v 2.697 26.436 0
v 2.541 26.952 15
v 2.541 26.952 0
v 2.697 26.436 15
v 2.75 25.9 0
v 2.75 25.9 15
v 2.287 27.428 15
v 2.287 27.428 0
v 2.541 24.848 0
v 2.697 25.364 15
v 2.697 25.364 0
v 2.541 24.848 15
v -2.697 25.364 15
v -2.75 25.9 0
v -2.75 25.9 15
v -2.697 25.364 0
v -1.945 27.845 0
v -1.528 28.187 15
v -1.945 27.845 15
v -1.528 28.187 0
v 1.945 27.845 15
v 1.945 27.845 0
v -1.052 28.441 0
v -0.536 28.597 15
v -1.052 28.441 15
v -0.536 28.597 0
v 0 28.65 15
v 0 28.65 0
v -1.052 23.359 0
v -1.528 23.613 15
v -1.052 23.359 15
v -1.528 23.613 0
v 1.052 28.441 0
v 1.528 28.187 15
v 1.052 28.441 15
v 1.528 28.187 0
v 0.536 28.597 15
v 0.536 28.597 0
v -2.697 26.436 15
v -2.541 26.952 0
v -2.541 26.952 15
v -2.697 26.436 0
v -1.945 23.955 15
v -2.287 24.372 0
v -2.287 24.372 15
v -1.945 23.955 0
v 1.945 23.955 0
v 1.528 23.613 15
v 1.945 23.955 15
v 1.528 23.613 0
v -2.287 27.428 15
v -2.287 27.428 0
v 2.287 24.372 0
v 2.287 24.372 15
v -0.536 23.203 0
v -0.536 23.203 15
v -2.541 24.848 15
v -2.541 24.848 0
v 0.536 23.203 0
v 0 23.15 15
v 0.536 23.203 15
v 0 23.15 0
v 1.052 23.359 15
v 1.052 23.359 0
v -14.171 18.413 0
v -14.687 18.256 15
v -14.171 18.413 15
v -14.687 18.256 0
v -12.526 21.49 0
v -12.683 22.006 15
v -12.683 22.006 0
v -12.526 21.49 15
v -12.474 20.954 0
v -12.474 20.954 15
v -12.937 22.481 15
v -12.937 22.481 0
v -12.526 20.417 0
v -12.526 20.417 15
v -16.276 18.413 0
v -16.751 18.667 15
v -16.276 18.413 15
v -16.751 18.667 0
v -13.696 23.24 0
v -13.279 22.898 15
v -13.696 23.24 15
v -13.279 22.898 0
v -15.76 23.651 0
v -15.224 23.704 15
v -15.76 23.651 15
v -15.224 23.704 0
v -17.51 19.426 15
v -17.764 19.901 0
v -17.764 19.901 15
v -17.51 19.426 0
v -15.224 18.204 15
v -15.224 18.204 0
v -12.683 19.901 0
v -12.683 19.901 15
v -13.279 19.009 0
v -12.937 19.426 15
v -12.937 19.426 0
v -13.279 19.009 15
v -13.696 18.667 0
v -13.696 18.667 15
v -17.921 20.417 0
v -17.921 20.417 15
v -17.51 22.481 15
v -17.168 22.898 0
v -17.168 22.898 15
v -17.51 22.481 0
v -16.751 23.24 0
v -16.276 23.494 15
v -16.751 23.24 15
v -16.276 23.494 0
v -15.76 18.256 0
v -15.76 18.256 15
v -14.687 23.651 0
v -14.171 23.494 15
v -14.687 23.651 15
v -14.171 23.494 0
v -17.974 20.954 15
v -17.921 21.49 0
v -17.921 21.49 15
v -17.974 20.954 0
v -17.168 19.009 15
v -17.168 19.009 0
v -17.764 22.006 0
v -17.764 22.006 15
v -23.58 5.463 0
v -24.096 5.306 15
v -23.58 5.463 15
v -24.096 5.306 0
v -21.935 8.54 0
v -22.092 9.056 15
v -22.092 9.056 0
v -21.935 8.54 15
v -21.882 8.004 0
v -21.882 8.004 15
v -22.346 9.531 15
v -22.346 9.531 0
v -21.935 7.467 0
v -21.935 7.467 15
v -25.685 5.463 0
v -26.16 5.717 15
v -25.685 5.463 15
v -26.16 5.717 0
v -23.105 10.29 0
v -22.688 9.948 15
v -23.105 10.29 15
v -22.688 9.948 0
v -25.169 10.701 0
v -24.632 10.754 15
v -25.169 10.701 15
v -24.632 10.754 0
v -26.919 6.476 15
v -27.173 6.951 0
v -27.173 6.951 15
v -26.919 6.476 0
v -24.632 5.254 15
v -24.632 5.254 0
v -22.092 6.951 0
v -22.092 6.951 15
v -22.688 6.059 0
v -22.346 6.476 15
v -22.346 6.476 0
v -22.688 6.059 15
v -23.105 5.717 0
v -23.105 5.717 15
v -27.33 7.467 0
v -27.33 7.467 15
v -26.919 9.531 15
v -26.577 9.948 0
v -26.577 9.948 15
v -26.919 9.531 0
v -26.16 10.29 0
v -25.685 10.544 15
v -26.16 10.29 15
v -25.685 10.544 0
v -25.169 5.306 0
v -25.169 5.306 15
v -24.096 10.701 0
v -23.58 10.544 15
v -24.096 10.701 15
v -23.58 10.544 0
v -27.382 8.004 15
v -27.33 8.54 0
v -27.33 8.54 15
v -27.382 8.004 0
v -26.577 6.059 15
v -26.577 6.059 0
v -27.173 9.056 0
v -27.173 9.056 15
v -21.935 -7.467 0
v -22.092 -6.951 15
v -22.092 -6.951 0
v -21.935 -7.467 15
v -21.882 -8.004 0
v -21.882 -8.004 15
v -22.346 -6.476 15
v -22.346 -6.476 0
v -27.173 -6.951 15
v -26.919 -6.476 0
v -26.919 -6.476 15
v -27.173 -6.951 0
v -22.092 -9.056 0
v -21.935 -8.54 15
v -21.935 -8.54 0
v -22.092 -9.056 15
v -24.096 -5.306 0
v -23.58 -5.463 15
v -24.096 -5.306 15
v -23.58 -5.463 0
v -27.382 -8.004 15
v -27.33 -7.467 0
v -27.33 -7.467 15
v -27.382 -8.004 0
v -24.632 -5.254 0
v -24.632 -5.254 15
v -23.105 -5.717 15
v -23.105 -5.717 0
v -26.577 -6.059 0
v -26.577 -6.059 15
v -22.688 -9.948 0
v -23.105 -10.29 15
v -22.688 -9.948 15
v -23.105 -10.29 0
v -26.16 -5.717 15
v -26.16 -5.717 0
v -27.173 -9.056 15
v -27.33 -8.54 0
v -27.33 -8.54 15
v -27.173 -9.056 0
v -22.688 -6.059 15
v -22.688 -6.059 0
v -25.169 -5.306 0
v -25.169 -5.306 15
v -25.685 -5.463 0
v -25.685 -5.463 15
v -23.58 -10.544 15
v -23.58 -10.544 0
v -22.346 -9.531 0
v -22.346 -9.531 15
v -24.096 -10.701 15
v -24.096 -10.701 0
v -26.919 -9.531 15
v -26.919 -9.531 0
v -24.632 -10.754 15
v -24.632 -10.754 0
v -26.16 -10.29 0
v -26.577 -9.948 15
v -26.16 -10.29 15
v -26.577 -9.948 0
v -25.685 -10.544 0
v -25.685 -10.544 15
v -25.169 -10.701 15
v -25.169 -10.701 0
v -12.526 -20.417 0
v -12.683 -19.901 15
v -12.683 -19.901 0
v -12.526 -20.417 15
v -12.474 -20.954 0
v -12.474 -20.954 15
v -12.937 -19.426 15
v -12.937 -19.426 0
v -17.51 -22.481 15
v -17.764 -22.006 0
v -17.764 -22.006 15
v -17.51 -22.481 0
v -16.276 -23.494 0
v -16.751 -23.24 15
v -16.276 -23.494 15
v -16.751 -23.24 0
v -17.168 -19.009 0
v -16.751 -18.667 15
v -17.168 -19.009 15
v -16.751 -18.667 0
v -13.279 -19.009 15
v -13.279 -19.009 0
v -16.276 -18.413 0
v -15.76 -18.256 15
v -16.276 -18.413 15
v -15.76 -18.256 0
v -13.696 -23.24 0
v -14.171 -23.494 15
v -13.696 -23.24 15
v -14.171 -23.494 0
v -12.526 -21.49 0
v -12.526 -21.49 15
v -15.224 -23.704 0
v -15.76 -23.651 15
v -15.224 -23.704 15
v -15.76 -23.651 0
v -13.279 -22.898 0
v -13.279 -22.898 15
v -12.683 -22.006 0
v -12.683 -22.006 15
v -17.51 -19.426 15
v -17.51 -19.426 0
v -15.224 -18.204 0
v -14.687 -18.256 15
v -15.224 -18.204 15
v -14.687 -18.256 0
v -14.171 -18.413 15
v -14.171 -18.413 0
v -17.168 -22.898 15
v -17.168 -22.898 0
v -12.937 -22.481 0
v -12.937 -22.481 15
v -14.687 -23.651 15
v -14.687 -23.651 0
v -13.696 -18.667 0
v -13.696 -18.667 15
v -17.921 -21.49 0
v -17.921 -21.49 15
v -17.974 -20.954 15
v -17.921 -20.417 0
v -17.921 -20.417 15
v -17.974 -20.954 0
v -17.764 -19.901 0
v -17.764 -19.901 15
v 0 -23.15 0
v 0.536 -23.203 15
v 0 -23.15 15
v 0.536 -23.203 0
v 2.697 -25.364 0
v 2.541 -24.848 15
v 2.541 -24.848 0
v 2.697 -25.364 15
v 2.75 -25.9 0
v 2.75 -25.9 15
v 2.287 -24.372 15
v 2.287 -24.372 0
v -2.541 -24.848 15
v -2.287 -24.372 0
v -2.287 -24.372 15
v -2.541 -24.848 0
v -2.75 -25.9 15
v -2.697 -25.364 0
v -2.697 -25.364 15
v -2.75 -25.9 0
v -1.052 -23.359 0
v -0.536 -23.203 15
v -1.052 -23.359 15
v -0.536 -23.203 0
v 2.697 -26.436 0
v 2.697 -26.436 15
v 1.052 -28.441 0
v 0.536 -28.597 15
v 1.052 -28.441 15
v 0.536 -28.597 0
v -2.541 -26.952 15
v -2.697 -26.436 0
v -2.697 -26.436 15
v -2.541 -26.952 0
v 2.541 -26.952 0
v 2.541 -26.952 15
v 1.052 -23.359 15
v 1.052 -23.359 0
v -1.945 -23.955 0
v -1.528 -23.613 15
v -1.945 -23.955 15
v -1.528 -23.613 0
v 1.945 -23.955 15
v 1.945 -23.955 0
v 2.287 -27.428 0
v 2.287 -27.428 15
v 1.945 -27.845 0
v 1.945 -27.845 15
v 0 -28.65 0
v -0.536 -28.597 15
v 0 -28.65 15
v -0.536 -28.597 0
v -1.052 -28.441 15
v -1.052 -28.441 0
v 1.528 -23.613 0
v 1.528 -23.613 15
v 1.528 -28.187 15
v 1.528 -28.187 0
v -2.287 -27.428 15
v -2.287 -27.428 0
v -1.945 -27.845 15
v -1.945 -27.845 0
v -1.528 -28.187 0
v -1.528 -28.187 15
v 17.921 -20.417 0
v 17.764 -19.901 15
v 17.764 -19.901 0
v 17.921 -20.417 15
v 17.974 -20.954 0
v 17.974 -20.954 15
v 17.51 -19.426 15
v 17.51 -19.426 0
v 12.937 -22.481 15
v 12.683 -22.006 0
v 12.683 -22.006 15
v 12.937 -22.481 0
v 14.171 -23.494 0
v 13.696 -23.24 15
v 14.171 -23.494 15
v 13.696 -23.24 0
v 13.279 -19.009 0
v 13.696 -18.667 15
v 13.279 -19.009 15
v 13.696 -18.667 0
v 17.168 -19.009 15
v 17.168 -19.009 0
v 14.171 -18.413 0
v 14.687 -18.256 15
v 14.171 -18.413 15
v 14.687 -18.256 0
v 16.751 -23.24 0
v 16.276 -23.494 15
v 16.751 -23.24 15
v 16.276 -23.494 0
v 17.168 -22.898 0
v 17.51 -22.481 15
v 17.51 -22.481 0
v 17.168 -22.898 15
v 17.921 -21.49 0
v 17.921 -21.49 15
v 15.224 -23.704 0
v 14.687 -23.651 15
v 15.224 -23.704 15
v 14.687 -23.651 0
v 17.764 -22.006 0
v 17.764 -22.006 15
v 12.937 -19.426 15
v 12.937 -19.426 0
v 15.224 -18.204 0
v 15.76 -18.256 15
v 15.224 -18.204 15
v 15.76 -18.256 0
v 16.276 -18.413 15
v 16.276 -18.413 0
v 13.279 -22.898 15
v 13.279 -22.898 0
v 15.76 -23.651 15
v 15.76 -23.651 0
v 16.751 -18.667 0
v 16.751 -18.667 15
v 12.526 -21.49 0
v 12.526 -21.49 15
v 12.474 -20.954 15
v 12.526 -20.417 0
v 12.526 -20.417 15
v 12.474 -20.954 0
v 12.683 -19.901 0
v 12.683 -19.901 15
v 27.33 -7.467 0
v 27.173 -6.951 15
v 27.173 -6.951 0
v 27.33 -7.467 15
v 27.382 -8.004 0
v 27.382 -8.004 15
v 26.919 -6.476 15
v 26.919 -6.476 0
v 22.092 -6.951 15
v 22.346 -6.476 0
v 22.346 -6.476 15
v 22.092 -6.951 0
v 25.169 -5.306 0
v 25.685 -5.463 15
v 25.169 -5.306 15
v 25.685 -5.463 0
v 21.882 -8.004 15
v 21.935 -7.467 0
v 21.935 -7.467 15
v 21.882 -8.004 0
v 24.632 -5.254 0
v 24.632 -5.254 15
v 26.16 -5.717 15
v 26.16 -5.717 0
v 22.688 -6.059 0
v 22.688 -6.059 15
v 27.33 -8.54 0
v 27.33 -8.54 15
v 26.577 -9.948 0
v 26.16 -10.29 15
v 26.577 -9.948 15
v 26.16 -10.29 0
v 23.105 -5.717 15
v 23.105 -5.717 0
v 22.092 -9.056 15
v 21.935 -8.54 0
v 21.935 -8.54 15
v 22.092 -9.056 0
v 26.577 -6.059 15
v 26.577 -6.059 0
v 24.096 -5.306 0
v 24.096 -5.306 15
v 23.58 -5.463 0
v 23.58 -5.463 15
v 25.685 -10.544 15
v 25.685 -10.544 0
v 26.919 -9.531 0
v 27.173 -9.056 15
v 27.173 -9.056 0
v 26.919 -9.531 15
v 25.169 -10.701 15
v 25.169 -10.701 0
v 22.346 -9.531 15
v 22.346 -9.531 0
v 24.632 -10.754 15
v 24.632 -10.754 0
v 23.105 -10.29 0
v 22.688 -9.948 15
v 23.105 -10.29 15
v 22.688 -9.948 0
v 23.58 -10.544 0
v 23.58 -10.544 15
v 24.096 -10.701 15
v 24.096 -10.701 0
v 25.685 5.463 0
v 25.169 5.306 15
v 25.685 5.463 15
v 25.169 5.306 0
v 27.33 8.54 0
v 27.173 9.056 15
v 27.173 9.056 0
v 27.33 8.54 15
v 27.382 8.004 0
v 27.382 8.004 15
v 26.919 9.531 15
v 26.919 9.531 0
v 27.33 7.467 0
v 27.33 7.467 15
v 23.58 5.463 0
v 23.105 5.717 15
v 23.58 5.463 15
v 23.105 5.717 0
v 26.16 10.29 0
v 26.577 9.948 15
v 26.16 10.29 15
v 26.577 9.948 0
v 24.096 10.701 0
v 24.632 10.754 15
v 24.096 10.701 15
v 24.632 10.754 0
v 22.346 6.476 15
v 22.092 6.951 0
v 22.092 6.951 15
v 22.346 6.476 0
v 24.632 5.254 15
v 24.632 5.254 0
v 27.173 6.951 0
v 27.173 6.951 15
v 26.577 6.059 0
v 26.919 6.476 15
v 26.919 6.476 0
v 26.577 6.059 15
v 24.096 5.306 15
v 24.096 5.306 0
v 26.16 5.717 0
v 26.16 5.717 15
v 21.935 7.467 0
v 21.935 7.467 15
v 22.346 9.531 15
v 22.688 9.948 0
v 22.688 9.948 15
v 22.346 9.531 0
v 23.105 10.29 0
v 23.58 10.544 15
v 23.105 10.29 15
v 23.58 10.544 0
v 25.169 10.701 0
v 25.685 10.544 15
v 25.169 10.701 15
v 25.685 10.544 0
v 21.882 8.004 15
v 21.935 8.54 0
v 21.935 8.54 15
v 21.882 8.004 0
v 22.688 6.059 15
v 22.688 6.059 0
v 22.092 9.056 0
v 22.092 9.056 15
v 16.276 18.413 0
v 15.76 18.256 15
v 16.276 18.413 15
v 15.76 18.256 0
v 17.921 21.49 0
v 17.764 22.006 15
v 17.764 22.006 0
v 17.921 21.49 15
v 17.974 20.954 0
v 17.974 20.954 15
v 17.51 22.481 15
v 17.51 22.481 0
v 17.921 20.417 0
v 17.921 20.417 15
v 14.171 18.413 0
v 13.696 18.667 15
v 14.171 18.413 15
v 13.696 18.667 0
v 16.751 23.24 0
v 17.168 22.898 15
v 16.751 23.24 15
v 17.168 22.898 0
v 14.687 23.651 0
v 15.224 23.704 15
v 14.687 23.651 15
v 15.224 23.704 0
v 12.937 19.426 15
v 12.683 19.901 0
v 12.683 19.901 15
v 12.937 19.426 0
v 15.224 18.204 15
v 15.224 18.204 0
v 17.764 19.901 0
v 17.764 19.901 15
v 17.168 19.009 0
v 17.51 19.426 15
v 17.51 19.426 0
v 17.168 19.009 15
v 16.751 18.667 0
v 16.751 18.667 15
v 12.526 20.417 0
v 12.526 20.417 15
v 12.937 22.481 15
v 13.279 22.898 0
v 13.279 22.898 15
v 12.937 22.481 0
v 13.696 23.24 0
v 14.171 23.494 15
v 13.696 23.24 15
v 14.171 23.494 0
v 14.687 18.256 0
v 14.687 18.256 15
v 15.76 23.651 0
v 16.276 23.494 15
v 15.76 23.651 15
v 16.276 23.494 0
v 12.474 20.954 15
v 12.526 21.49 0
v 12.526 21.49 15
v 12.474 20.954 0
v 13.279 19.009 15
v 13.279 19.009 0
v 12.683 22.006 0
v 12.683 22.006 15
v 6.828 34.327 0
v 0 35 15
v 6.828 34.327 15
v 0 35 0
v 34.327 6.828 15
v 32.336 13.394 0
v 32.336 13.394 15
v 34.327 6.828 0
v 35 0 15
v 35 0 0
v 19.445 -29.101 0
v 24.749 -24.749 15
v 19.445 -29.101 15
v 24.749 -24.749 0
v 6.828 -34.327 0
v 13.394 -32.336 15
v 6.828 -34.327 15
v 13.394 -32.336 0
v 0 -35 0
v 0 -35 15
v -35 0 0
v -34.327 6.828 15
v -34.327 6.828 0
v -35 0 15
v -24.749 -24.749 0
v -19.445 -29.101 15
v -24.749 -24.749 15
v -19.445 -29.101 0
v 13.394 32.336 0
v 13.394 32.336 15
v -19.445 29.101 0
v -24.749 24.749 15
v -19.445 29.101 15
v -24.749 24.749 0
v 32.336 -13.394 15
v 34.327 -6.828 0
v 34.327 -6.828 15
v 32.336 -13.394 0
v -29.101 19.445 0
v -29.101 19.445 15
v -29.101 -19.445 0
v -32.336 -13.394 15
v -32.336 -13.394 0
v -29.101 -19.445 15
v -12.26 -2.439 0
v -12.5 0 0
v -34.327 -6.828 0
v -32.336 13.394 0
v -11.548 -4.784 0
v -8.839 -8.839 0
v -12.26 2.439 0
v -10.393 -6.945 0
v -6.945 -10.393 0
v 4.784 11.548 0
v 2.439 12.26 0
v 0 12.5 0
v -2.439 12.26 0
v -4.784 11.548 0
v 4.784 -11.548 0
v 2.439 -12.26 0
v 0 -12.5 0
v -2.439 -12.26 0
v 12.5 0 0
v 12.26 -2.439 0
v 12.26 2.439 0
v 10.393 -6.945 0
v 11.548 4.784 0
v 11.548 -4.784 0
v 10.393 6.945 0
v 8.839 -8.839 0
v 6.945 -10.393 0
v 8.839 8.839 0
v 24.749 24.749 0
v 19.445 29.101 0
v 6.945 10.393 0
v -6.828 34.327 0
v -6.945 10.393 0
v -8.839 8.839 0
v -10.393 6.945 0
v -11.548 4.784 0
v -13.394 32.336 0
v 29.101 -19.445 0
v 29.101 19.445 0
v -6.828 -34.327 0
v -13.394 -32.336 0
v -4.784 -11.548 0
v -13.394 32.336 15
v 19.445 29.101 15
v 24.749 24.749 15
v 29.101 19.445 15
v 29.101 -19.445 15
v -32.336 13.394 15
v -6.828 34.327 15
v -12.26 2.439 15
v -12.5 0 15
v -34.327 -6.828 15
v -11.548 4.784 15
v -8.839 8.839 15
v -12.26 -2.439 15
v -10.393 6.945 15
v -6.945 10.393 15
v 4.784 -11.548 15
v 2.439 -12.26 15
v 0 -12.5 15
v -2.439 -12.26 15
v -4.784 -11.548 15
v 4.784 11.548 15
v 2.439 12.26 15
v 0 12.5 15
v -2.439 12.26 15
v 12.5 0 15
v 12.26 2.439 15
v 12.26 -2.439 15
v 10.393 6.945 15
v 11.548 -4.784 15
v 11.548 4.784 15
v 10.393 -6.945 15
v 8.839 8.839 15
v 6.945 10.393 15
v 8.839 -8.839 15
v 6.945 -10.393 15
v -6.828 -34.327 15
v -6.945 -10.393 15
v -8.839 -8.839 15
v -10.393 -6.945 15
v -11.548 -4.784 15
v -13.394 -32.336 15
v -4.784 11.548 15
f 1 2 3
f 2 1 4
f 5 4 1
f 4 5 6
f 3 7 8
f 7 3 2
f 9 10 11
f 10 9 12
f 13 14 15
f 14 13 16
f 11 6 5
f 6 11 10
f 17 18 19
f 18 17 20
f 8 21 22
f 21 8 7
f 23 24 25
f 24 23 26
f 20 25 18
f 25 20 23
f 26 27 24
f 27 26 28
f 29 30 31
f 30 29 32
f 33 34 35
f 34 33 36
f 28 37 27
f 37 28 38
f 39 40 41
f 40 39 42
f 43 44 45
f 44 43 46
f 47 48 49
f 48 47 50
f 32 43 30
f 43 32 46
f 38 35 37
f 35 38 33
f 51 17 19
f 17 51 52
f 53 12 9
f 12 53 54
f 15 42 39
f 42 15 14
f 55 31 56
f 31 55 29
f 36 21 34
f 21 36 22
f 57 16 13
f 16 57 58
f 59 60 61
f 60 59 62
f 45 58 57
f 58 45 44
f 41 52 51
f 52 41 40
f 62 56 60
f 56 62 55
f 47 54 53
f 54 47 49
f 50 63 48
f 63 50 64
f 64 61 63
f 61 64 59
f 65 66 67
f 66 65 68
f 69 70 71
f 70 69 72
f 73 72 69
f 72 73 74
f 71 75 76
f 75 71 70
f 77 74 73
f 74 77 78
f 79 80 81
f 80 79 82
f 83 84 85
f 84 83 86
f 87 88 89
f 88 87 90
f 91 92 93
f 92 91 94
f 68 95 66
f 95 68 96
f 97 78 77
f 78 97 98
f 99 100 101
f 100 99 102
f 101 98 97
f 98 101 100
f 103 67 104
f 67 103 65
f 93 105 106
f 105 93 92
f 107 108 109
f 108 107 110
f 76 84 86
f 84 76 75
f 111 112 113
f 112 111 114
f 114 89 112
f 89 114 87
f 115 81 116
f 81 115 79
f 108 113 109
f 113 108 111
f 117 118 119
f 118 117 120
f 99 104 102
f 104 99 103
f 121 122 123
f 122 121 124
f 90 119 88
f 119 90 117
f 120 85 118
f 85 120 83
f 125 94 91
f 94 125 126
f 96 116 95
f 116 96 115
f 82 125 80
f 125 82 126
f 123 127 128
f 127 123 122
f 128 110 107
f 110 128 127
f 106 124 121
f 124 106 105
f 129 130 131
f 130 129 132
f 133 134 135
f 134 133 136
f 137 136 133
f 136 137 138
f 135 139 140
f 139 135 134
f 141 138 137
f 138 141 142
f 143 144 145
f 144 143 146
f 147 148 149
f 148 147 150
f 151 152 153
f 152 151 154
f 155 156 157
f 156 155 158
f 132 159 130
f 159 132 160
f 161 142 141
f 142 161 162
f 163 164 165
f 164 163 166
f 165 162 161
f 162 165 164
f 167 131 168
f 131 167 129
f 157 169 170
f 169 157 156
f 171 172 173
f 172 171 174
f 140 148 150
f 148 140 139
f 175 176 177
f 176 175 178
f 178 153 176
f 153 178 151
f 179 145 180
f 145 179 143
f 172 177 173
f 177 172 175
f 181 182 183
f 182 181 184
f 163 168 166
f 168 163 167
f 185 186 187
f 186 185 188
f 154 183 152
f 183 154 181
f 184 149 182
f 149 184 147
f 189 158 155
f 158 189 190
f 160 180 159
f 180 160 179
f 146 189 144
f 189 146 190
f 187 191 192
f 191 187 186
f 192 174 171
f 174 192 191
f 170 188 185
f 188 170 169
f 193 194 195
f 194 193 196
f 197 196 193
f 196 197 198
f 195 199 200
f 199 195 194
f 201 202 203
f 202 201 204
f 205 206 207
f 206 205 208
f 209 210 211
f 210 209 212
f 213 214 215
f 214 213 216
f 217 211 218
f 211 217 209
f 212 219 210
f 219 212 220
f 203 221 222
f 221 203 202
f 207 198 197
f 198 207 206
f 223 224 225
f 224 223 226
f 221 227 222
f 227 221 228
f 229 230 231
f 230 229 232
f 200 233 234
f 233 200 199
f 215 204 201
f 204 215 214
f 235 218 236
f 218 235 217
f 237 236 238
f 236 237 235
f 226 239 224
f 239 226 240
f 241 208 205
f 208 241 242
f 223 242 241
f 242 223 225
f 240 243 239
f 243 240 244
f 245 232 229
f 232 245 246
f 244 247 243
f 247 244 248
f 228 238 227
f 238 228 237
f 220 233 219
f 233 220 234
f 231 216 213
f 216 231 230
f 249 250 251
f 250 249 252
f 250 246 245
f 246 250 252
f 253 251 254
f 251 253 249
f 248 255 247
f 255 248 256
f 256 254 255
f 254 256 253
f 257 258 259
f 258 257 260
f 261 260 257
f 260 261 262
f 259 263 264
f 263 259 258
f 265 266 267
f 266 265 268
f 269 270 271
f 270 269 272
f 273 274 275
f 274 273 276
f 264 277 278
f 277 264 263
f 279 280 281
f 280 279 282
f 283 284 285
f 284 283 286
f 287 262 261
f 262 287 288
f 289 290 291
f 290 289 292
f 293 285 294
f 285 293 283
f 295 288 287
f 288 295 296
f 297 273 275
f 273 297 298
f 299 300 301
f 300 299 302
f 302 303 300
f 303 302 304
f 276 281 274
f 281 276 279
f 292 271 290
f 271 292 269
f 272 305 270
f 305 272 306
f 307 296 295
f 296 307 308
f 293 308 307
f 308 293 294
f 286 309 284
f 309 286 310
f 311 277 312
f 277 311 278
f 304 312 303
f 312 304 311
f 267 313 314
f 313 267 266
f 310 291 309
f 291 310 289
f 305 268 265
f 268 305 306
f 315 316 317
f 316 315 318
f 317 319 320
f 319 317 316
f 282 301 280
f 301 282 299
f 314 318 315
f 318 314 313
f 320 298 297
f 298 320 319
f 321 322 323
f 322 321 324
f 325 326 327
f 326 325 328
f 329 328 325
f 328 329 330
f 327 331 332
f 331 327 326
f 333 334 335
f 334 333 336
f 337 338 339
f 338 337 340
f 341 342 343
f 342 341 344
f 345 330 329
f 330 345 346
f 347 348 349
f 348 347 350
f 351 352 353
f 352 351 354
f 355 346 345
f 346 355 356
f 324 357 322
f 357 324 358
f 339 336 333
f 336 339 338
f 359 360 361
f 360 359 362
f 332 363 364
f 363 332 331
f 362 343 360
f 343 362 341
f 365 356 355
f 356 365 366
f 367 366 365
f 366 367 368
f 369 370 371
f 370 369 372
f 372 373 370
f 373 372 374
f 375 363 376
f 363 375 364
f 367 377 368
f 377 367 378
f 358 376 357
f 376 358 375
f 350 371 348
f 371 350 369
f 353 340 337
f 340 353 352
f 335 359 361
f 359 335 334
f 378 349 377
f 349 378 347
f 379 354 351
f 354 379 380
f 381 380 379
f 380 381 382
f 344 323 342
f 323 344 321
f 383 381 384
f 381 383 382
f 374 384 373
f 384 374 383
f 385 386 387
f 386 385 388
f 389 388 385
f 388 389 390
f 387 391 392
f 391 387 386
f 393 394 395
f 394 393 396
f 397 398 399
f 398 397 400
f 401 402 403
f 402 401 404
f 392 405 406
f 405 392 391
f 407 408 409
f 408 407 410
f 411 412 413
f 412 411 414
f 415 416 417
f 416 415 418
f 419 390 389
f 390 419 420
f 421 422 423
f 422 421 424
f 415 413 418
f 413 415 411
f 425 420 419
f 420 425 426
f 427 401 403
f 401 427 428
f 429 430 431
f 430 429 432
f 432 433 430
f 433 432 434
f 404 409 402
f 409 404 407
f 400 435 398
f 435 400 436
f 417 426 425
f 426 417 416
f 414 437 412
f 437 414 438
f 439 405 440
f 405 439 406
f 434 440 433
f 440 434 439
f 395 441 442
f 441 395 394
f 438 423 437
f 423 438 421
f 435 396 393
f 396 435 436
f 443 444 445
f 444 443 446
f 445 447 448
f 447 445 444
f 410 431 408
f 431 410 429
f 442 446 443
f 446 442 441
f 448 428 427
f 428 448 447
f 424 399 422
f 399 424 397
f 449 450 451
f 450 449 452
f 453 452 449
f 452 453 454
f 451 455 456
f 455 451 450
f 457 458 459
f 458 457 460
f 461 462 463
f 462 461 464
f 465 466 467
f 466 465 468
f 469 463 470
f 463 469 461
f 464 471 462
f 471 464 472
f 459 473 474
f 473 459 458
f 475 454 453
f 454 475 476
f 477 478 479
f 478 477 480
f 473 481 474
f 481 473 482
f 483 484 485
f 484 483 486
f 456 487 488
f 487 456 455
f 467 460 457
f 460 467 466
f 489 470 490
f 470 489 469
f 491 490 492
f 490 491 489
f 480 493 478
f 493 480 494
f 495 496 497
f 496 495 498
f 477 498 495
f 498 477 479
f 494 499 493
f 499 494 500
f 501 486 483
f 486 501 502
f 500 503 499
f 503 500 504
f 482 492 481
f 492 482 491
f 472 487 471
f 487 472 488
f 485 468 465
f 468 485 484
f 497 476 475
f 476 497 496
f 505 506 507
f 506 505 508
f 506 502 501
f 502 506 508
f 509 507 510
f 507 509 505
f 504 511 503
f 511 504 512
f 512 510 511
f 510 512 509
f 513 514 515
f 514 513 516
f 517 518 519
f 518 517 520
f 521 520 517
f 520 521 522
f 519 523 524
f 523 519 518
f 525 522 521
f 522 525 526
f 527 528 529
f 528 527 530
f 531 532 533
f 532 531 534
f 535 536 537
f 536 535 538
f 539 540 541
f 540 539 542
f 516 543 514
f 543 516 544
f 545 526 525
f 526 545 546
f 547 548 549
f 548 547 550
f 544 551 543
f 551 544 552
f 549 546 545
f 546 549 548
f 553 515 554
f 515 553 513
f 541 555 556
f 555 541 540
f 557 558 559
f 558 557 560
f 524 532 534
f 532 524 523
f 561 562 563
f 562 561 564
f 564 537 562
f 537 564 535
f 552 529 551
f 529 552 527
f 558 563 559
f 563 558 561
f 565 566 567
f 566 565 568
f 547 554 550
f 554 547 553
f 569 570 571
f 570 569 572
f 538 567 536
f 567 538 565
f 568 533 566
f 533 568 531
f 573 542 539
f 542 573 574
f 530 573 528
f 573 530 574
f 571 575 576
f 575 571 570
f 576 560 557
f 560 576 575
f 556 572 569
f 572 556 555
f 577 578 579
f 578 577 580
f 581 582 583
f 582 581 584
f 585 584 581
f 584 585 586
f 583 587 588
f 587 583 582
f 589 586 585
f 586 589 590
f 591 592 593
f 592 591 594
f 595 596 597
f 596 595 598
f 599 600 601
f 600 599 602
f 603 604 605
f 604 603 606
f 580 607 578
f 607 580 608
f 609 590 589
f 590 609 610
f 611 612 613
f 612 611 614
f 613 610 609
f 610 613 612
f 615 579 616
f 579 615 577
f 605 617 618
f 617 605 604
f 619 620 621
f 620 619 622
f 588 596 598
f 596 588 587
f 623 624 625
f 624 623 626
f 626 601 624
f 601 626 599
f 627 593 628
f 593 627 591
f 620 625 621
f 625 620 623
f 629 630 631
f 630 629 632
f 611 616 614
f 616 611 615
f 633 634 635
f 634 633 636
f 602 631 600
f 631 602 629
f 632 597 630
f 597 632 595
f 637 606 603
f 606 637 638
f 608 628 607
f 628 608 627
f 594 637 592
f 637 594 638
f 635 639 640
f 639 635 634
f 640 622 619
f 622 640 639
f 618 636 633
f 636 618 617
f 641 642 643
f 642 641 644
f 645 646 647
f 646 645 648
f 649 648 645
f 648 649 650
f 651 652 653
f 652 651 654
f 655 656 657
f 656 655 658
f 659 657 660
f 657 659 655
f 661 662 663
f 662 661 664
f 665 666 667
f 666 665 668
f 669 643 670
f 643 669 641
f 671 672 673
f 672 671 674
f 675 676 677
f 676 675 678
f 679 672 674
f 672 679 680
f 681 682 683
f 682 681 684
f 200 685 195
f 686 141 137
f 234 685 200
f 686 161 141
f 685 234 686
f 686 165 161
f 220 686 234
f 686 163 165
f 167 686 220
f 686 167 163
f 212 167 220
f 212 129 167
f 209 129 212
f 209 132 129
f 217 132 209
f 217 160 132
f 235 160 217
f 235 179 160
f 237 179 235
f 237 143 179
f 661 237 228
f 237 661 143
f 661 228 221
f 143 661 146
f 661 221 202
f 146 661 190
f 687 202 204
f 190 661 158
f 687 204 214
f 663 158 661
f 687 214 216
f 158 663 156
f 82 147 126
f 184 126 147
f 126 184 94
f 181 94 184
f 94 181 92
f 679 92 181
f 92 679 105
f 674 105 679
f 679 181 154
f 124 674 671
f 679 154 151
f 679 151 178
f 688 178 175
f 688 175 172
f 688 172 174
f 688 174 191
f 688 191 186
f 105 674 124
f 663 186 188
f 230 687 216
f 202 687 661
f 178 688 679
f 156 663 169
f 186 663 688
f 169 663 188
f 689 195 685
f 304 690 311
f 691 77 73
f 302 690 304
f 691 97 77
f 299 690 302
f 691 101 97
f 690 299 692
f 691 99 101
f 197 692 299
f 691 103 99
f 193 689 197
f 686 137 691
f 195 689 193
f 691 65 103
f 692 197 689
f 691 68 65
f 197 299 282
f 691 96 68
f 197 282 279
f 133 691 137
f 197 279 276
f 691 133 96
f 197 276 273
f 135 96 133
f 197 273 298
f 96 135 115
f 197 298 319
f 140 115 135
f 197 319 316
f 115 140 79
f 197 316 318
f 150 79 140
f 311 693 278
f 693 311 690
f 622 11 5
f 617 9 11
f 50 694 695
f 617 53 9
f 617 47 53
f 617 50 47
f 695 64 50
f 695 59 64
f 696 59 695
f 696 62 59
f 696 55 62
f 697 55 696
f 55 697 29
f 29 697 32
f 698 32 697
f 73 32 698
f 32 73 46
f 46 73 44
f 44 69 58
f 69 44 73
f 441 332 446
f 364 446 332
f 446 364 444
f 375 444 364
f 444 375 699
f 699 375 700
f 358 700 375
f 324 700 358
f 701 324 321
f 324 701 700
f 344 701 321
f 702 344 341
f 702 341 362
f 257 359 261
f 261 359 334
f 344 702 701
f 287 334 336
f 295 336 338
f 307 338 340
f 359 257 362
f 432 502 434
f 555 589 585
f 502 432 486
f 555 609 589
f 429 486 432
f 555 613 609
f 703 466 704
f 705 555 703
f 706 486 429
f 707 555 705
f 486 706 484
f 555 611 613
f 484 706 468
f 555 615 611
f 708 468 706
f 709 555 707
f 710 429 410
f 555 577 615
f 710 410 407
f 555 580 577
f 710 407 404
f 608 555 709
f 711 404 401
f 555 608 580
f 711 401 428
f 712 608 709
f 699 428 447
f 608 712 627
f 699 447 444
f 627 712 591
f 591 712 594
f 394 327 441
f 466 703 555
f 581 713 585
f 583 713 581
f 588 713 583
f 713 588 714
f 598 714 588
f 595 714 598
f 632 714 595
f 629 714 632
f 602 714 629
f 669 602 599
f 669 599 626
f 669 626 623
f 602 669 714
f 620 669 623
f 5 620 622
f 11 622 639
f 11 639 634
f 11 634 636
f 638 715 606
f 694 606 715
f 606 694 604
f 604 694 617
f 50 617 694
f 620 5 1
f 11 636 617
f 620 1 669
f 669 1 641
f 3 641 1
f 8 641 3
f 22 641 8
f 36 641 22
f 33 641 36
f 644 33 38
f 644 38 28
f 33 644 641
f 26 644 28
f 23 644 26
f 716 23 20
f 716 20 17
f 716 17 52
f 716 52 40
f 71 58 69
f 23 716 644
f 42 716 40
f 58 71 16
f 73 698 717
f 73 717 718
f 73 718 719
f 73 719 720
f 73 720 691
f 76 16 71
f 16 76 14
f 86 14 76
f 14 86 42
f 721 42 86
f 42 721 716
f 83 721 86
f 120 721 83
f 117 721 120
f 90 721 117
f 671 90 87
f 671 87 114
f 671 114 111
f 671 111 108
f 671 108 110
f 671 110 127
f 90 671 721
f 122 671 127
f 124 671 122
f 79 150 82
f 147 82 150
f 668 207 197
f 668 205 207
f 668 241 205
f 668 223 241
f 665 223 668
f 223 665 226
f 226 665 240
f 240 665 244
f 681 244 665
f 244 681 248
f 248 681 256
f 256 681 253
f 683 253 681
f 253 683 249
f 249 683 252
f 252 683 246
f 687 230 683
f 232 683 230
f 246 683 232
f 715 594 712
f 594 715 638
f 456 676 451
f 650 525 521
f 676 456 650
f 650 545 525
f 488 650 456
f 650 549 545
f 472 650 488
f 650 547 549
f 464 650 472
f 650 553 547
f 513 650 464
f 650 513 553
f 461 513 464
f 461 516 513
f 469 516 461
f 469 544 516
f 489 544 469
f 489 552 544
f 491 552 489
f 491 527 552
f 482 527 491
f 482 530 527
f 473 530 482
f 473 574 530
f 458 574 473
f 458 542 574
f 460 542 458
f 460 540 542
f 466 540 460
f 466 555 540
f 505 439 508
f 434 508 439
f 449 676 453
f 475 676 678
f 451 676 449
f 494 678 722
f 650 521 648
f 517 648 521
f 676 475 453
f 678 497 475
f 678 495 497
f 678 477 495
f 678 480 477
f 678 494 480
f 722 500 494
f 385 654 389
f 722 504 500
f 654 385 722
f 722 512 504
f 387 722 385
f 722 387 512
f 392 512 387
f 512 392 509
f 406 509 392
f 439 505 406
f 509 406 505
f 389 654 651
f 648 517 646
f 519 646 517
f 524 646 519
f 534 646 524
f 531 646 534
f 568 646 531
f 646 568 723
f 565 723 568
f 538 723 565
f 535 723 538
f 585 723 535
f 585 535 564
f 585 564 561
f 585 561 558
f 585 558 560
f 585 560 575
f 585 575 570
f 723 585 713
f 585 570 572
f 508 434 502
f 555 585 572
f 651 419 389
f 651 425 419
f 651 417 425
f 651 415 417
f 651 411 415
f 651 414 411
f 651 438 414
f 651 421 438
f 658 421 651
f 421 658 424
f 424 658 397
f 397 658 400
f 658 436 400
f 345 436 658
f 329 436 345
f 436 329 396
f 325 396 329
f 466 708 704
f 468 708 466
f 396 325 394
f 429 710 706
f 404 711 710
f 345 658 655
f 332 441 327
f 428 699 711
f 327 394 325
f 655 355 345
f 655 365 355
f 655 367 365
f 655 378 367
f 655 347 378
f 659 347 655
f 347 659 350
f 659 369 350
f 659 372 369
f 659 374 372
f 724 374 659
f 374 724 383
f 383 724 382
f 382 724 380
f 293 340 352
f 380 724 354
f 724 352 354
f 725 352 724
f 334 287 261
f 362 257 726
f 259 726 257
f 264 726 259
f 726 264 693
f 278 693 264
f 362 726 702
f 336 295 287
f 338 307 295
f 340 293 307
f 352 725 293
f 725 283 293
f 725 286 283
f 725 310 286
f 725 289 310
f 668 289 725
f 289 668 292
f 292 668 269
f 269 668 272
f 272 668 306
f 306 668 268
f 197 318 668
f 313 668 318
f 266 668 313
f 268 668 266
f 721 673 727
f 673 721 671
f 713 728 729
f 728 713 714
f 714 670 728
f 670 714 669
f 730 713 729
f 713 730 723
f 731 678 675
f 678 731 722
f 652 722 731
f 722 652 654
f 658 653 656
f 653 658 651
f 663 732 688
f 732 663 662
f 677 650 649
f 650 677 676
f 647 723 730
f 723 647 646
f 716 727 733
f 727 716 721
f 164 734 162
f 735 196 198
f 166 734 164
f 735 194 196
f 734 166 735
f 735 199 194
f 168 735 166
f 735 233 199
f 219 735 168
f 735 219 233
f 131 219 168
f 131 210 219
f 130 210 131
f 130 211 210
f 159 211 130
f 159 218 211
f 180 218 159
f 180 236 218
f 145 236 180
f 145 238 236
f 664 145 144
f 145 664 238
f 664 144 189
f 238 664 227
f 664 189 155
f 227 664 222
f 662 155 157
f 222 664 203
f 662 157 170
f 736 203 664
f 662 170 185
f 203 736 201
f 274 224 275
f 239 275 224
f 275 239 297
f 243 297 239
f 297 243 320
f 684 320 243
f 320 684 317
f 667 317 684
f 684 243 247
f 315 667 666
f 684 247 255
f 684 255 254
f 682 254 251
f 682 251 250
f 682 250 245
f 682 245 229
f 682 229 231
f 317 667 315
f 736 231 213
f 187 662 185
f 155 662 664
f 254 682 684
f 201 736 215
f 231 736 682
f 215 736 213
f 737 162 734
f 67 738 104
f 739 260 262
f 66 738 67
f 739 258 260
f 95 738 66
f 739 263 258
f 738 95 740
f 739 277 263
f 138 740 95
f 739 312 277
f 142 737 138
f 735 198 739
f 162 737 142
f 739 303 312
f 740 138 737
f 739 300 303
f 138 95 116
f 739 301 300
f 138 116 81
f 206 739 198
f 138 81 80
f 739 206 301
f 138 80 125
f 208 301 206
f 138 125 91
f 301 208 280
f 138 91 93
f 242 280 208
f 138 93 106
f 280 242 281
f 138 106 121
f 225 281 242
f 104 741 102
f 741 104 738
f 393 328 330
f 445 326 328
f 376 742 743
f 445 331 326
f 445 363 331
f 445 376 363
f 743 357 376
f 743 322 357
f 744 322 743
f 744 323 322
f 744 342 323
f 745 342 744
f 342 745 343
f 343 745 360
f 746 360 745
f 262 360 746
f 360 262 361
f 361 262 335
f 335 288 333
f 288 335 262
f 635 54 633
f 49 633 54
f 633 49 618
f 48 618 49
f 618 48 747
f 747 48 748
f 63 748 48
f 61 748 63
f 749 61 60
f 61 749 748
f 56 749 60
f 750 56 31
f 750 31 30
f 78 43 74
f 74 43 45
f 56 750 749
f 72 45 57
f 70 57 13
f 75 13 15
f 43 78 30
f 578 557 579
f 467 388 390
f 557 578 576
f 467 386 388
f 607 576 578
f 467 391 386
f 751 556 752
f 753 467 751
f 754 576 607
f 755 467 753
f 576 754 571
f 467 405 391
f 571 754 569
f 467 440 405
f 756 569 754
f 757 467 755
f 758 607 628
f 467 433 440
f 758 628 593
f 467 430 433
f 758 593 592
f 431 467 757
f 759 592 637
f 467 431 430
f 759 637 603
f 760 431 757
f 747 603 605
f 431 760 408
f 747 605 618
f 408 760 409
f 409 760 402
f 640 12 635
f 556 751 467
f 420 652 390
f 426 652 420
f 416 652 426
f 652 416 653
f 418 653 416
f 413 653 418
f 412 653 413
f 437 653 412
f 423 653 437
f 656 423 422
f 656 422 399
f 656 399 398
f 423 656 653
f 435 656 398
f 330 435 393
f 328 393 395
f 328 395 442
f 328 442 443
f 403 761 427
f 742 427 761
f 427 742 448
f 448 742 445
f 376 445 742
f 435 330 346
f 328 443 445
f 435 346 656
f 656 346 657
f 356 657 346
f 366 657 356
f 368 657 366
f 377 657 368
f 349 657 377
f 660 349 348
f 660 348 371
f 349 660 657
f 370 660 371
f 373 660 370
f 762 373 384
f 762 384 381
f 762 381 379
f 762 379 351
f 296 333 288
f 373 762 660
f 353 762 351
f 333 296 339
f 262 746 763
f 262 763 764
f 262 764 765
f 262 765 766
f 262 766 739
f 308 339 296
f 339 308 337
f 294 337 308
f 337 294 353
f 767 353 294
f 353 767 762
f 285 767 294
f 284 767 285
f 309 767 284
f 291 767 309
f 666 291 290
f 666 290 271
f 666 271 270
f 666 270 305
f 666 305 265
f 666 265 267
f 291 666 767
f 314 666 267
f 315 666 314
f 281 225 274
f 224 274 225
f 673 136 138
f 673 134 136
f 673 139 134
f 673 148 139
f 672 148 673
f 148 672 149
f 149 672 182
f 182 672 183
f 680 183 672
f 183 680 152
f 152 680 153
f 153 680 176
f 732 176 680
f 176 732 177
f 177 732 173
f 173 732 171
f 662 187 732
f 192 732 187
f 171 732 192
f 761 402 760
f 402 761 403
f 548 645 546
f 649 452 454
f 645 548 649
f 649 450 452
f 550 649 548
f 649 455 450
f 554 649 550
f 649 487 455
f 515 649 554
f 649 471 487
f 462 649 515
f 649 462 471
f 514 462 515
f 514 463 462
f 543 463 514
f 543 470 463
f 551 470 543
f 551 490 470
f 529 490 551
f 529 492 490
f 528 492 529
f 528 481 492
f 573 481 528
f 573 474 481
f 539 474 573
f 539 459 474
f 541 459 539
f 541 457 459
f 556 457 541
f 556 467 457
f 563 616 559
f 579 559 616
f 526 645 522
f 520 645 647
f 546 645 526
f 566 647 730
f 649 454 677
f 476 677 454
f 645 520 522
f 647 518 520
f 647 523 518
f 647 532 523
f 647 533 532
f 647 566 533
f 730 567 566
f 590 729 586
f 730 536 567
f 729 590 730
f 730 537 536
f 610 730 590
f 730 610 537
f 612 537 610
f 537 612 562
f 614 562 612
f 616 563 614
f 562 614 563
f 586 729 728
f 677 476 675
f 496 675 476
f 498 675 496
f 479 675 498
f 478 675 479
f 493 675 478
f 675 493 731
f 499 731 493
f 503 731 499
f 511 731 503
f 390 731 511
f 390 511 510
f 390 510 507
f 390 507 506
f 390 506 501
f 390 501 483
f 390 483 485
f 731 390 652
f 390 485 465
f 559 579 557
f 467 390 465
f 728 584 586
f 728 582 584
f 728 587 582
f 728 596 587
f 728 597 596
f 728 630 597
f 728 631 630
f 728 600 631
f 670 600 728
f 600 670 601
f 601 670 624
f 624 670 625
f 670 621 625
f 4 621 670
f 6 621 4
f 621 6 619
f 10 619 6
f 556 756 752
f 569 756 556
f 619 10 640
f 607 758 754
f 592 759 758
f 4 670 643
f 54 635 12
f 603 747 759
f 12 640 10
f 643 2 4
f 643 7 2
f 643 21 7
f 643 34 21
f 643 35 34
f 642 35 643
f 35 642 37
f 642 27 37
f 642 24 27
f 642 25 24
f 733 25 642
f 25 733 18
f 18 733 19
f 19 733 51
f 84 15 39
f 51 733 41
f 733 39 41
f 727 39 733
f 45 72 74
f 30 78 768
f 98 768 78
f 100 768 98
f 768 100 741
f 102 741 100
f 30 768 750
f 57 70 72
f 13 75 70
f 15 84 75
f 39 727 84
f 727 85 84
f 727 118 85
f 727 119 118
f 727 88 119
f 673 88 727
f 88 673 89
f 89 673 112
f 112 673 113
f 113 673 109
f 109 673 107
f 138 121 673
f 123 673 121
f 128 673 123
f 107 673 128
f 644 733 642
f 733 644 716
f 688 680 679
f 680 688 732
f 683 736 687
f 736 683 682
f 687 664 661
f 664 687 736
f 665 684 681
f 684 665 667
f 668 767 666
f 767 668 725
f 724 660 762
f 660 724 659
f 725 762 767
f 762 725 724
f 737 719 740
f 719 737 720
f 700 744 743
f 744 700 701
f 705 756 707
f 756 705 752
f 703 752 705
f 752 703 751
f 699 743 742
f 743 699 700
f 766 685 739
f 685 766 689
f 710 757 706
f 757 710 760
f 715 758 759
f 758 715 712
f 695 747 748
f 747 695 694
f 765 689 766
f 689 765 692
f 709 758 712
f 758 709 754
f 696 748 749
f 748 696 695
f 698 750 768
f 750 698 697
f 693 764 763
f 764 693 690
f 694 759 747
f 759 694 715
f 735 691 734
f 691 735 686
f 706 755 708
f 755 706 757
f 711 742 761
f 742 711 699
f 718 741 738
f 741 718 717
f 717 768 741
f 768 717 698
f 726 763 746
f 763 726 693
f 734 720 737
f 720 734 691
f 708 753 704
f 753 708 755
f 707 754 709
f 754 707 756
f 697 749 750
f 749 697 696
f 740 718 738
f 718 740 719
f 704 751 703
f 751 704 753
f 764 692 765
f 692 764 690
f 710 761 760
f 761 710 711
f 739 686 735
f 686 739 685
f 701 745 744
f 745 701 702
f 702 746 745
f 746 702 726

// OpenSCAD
$fn = 32;

// ----------------------------------------------------------------------
// Flange Ø70 x 15
// 10 holes on a Ø51.8 bolt circle, bolted joints
// ----------------------------------------------------------------------

// --- parameters (mm) ---
flange_d = 70;   // outside diameter of the flange
thickness = 15;  // flange thickness
holes = 10;      // number of bolt holes
pcd = 51.8;      // bolt circle diameter
start_deg = 90;  // angle of the first hole, from +X
hole_d = 5.5;    // bolt hole diameter
bore_d = 25;     // central through bore
hub_d = 37;      // hub outside diameter
hub_h = 0;       // hub height above the flange face (0 = no hub)

// --- derived feature positions (mm) ---
height = thickness + hub_h;  // = 15   overall height of the part
pcd_r = pcd / 2;             // = 25.9   bolt circle radius
hole_step = 360 / holes;     // = 36   angular pitch
feature_centers = [
  [pcd_r * cos(start_deg + 0 * hole_step), pcd_r * sin(start_deg + 0 * hole_step)],
  [pcd_r * cos(start_deg + 1 * hole_step), pcd_r * sin(start_deg + 1 * hole_step)],
  [pcd_r * cos(start_deg + 2 * hole_step), pcd_r * sin(start_deg + 2 * hole_step)],
  [pcd_r * cos(start_deg + 3 * hole_step), pcd_r * sin(start_deg + 3 * hole_step)],
  [pcd_r * cos(start_deg + 4 * hole_step), pcd_r * sin(start_deg + 4 * hole_step)],
  [pcd_r * cos(start_deg + 5 * hole_step), pcd_r * sin(start_deg + 5 * hole_step)],
  [pcd_r * cos(start_deg + 6 * hole_step), pcd_r * sin(start_deg + 6 * hole_step)],
  [pcd_r * cos(start_deg + 7 * hole_step), pcd_r * sin(start_deg + 7 * hole_step)],
  [pcd_r * cos(start_deg + 8 * hole_step), pcd_r * sin(start_deg + 8 * hole_step)],
  [pcd_r * cos(start_deg + 9 * hole_step), pcd_r * sin(start_deg + 9 * hole_step)]
];   // bolt hole centres on the pitch circle

// flange disc, every hole and the bore cut straight through
difference() {
  union() {
    cylinder(d = flange_d, h = thickness);
  }
  translate([0, 0, -1]) cylinder(d = bore_d, h = height + 2);  // bore, through
  for (centre = feature_centers)
    translate([centre[0], centre[1], -1]) cylinder(d = hole_d, h = thickness + 2);
}
